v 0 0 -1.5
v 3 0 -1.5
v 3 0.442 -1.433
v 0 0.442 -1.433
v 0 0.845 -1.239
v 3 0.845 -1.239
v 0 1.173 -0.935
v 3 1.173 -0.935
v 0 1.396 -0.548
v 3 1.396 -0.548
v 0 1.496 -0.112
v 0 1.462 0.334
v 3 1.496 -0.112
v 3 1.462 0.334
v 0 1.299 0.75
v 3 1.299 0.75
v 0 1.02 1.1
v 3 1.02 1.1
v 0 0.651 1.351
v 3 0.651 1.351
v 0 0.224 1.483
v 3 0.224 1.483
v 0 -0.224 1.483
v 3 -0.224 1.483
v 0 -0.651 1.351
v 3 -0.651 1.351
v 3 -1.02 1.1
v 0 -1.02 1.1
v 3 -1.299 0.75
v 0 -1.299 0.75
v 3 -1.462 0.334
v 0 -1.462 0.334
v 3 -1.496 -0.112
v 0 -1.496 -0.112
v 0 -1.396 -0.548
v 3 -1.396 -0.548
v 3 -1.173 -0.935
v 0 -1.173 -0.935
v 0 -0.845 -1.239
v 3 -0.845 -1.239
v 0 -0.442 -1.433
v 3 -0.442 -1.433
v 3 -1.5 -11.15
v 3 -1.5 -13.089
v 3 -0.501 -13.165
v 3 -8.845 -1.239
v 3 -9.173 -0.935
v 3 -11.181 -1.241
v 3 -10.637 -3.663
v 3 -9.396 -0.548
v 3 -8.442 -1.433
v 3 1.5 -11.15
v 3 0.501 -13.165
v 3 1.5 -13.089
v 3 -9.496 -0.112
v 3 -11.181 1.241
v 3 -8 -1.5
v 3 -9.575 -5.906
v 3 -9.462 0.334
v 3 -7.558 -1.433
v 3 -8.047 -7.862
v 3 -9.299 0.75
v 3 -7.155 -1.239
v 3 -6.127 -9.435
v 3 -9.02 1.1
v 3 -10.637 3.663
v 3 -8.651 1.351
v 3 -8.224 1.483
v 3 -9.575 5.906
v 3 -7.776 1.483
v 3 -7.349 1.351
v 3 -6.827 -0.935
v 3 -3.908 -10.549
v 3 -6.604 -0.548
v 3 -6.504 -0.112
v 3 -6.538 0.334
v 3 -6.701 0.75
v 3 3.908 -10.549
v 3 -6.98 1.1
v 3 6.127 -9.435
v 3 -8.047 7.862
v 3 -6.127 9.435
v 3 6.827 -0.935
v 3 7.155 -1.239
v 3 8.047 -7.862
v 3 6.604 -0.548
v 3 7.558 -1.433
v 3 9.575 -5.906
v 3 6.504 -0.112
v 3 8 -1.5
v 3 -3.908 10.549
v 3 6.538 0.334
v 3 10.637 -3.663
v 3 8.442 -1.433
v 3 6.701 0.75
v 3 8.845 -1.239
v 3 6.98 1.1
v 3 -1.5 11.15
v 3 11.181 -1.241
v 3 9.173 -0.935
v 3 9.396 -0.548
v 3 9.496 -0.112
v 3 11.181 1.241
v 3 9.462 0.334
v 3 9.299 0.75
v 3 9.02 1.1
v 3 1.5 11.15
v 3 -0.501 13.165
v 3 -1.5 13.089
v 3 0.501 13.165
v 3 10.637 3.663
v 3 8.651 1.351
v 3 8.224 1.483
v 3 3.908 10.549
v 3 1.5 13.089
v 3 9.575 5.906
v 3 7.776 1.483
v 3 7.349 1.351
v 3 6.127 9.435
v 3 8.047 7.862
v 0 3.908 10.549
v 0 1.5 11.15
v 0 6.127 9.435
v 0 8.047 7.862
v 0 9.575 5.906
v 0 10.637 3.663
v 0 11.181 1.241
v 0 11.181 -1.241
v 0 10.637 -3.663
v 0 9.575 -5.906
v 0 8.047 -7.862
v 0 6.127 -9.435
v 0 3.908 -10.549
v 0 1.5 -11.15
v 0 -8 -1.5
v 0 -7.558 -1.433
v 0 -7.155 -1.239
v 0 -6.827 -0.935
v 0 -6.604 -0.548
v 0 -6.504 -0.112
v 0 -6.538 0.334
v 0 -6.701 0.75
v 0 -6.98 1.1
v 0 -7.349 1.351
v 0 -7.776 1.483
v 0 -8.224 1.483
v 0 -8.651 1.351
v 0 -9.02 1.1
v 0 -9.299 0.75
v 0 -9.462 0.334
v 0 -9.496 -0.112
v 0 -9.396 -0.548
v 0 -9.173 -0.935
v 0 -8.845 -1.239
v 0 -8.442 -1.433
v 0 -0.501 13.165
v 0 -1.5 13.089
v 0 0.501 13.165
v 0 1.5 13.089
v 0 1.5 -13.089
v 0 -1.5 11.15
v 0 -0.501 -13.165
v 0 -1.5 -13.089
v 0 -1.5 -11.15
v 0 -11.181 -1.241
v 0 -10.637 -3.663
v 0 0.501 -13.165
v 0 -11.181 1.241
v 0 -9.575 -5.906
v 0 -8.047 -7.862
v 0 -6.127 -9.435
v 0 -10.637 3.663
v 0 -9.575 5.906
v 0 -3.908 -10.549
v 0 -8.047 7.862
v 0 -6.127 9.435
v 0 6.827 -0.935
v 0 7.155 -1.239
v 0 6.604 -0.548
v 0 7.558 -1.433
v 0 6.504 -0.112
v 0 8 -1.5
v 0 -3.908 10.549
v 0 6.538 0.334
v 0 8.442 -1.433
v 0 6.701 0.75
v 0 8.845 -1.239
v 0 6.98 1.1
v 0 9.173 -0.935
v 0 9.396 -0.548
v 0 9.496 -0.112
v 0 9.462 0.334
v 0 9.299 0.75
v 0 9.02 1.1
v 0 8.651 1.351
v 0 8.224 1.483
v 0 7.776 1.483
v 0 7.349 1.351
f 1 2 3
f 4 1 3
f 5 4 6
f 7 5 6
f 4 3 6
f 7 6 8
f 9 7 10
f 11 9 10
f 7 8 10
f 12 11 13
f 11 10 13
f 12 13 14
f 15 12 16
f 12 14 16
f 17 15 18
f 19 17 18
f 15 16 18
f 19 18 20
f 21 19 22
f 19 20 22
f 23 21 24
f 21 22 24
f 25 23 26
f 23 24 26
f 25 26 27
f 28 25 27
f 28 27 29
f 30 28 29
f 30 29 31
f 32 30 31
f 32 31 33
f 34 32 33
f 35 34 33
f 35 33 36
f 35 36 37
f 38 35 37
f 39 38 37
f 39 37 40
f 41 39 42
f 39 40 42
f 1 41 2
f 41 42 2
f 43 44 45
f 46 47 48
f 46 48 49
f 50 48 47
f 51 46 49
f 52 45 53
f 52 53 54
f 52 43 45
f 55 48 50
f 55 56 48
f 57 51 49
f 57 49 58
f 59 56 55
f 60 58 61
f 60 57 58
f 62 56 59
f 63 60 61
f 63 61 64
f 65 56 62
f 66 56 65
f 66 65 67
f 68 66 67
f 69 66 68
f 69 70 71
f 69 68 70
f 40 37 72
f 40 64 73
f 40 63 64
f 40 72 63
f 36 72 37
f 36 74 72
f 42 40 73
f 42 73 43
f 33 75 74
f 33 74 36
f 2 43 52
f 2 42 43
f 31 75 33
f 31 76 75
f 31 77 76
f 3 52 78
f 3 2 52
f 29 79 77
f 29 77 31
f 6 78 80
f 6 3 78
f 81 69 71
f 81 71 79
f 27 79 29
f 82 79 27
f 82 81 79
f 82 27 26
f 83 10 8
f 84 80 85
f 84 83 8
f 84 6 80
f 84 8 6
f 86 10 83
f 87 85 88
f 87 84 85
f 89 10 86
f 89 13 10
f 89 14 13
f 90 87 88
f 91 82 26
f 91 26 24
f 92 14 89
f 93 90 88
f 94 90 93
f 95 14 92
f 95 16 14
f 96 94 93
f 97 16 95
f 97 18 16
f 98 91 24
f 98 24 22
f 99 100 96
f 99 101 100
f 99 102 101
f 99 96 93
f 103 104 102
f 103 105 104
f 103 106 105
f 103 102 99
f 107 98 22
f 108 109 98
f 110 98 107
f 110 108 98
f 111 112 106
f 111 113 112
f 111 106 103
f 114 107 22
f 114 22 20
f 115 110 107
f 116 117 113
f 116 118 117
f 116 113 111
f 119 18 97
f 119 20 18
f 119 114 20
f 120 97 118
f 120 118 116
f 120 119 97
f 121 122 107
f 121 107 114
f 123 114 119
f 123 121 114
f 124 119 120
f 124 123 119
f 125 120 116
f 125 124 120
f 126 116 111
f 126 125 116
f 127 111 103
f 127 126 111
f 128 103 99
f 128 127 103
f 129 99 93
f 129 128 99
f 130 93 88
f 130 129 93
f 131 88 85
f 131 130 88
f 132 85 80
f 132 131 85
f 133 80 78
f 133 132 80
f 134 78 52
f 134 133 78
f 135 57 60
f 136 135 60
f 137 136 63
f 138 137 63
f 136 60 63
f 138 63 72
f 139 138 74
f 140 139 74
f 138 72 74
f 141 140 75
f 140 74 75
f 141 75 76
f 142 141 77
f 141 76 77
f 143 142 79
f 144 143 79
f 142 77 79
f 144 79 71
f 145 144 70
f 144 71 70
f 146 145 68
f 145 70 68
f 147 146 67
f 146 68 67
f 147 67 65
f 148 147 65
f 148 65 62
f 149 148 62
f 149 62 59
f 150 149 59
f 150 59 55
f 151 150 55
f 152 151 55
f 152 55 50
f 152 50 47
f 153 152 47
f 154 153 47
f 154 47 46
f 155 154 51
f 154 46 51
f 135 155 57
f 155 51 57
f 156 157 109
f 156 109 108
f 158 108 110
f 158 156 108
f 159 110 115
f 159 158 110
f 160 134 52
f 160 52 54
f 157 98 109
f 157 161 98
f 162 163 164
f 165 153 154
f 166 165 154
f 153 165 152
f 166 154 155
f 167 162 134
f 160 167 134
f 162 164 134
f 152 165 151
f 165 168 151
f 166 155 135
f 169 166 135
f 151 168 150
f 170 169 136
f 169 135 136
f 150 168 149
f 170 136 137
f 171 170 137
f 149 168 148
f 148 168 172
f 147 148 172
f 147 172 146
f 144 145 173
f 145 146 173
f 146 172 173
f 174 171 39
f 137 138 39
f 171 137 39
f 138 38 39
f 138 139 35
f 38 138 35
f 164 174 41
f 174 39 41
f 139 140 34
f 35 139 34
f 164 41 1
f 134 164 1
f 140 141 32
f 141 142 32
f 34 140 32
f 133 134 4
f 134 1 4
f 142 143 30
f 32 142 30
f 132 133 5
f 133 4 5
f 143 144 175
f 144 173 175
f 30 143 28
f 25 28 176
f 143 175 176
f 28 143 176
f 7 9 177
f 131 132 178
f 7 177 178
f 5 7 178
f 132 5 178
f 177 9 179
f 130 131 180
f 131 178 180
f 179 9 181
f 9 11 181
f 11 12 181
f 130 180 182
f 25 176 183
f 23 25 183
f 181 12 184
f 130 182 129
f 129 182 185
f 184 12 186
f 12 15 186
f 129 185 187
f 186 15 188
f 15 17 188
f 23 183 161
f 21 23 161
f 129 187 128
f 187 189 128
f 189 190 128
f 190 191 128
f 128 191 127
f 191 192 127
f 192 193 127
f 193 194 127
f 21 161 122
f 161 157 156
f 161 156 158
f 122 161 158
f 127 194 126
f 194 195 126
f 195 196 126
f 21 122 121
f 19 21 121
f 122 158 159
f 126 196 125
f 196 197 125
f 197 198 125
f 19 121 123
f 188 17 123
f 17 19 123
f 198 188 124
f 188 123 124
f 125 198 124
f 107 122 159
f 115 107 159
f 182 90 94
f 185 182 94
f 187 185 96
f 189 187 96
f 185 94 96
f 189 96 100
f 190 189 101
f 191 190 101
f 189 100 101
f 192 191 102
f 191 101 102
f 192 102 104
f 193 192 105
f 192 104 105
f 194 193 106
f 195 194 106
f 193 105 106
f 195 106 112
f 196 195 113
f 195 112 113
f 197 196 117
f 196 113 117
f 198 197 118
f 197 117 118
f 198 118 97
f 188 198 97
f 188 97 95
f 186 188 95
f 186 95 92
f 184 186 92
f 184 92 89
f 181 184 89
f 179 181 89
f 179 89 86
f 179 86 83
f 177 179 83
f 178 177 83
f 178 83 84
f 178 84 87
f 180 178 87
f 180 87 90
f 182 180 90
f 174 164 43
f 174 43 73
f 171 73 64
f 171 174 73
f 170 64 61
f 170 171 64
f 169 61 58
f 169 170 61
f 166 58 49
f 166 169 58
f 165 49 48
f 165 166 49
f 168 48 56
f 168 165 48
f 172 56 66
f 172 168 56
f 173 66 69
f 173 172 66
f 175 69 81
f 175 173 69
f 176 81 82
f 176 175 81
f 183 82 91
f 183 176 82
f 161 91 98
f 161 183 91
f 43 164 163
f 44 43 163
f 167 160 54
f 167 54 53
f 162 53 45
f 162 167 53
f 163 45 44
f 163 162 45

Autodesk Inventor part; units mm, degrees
ref_plane "YZ Plane" through (0, 0, 0) normal (1, 0, 0) x (0, 1, 0)
ref_plane "XZ Plane" through (0, 0, 0) normal (0, 1, 0) x (-1, 0, 0)
ref_plane "XY Plane" through (0, 0, 0) normal (0, 0, 1) x (1, 0, 0)
sketch "Boceto1" plane through (0, 0, 0) normal (1, 0, 0) x (0, 1, 0)
  line L0 (1.5, -11.1496) -> (1.5, -13.0893)
  line L1 (-1.5, -11.1496) -> (-1.5, -13.0893)
  line L2 (-1.5, 11.1496) -> (-1.5, 13.0893)
  line L3 (1.5, 11.1496) -> (1.5, 13.0893)
  arc A0 (1.5, 13.0893) -> (-1.5, 13.0893) centre (0, 0) ccw
  arc A1 (-1.5, -13.0893) -> (1.5, -13.0893) centre (0, 0) ccw
  arc A2 (-1.5, 11.1496) -> (-1.5, -11.1496) centre (0, 0) ccw
  arc A3 (1.5, -11.1496) -> (1.5, 11.1496) centre (0, 0) ccw
extrude "Extrusión1" add sketch "Boceto1" along normal blind 3
sketch "Boceto2" plane through (3, 0, 0) normal (1, 0, 0) x (0, 0, -1)
  circle A0 centre (0, 8) radius 1.5
  circle A1 centre (0, -8) radius 1.5
  dimension "d14" = 3
  dimension "d15" = 3
extrude "Extrusión2" cut sketch "Boceto2" against normal blind 3
sketch "Boceto3" plane through (3, 0, 0) normal (1, 0, 0) x (0, 0, -1)
  circle A0 centre (0, 0) radius 1.5
  dimension "d18" = 3
extrude "Extrusión3" cut sketch "Boceto3" against normal blind 10
properties part number "tapa"
